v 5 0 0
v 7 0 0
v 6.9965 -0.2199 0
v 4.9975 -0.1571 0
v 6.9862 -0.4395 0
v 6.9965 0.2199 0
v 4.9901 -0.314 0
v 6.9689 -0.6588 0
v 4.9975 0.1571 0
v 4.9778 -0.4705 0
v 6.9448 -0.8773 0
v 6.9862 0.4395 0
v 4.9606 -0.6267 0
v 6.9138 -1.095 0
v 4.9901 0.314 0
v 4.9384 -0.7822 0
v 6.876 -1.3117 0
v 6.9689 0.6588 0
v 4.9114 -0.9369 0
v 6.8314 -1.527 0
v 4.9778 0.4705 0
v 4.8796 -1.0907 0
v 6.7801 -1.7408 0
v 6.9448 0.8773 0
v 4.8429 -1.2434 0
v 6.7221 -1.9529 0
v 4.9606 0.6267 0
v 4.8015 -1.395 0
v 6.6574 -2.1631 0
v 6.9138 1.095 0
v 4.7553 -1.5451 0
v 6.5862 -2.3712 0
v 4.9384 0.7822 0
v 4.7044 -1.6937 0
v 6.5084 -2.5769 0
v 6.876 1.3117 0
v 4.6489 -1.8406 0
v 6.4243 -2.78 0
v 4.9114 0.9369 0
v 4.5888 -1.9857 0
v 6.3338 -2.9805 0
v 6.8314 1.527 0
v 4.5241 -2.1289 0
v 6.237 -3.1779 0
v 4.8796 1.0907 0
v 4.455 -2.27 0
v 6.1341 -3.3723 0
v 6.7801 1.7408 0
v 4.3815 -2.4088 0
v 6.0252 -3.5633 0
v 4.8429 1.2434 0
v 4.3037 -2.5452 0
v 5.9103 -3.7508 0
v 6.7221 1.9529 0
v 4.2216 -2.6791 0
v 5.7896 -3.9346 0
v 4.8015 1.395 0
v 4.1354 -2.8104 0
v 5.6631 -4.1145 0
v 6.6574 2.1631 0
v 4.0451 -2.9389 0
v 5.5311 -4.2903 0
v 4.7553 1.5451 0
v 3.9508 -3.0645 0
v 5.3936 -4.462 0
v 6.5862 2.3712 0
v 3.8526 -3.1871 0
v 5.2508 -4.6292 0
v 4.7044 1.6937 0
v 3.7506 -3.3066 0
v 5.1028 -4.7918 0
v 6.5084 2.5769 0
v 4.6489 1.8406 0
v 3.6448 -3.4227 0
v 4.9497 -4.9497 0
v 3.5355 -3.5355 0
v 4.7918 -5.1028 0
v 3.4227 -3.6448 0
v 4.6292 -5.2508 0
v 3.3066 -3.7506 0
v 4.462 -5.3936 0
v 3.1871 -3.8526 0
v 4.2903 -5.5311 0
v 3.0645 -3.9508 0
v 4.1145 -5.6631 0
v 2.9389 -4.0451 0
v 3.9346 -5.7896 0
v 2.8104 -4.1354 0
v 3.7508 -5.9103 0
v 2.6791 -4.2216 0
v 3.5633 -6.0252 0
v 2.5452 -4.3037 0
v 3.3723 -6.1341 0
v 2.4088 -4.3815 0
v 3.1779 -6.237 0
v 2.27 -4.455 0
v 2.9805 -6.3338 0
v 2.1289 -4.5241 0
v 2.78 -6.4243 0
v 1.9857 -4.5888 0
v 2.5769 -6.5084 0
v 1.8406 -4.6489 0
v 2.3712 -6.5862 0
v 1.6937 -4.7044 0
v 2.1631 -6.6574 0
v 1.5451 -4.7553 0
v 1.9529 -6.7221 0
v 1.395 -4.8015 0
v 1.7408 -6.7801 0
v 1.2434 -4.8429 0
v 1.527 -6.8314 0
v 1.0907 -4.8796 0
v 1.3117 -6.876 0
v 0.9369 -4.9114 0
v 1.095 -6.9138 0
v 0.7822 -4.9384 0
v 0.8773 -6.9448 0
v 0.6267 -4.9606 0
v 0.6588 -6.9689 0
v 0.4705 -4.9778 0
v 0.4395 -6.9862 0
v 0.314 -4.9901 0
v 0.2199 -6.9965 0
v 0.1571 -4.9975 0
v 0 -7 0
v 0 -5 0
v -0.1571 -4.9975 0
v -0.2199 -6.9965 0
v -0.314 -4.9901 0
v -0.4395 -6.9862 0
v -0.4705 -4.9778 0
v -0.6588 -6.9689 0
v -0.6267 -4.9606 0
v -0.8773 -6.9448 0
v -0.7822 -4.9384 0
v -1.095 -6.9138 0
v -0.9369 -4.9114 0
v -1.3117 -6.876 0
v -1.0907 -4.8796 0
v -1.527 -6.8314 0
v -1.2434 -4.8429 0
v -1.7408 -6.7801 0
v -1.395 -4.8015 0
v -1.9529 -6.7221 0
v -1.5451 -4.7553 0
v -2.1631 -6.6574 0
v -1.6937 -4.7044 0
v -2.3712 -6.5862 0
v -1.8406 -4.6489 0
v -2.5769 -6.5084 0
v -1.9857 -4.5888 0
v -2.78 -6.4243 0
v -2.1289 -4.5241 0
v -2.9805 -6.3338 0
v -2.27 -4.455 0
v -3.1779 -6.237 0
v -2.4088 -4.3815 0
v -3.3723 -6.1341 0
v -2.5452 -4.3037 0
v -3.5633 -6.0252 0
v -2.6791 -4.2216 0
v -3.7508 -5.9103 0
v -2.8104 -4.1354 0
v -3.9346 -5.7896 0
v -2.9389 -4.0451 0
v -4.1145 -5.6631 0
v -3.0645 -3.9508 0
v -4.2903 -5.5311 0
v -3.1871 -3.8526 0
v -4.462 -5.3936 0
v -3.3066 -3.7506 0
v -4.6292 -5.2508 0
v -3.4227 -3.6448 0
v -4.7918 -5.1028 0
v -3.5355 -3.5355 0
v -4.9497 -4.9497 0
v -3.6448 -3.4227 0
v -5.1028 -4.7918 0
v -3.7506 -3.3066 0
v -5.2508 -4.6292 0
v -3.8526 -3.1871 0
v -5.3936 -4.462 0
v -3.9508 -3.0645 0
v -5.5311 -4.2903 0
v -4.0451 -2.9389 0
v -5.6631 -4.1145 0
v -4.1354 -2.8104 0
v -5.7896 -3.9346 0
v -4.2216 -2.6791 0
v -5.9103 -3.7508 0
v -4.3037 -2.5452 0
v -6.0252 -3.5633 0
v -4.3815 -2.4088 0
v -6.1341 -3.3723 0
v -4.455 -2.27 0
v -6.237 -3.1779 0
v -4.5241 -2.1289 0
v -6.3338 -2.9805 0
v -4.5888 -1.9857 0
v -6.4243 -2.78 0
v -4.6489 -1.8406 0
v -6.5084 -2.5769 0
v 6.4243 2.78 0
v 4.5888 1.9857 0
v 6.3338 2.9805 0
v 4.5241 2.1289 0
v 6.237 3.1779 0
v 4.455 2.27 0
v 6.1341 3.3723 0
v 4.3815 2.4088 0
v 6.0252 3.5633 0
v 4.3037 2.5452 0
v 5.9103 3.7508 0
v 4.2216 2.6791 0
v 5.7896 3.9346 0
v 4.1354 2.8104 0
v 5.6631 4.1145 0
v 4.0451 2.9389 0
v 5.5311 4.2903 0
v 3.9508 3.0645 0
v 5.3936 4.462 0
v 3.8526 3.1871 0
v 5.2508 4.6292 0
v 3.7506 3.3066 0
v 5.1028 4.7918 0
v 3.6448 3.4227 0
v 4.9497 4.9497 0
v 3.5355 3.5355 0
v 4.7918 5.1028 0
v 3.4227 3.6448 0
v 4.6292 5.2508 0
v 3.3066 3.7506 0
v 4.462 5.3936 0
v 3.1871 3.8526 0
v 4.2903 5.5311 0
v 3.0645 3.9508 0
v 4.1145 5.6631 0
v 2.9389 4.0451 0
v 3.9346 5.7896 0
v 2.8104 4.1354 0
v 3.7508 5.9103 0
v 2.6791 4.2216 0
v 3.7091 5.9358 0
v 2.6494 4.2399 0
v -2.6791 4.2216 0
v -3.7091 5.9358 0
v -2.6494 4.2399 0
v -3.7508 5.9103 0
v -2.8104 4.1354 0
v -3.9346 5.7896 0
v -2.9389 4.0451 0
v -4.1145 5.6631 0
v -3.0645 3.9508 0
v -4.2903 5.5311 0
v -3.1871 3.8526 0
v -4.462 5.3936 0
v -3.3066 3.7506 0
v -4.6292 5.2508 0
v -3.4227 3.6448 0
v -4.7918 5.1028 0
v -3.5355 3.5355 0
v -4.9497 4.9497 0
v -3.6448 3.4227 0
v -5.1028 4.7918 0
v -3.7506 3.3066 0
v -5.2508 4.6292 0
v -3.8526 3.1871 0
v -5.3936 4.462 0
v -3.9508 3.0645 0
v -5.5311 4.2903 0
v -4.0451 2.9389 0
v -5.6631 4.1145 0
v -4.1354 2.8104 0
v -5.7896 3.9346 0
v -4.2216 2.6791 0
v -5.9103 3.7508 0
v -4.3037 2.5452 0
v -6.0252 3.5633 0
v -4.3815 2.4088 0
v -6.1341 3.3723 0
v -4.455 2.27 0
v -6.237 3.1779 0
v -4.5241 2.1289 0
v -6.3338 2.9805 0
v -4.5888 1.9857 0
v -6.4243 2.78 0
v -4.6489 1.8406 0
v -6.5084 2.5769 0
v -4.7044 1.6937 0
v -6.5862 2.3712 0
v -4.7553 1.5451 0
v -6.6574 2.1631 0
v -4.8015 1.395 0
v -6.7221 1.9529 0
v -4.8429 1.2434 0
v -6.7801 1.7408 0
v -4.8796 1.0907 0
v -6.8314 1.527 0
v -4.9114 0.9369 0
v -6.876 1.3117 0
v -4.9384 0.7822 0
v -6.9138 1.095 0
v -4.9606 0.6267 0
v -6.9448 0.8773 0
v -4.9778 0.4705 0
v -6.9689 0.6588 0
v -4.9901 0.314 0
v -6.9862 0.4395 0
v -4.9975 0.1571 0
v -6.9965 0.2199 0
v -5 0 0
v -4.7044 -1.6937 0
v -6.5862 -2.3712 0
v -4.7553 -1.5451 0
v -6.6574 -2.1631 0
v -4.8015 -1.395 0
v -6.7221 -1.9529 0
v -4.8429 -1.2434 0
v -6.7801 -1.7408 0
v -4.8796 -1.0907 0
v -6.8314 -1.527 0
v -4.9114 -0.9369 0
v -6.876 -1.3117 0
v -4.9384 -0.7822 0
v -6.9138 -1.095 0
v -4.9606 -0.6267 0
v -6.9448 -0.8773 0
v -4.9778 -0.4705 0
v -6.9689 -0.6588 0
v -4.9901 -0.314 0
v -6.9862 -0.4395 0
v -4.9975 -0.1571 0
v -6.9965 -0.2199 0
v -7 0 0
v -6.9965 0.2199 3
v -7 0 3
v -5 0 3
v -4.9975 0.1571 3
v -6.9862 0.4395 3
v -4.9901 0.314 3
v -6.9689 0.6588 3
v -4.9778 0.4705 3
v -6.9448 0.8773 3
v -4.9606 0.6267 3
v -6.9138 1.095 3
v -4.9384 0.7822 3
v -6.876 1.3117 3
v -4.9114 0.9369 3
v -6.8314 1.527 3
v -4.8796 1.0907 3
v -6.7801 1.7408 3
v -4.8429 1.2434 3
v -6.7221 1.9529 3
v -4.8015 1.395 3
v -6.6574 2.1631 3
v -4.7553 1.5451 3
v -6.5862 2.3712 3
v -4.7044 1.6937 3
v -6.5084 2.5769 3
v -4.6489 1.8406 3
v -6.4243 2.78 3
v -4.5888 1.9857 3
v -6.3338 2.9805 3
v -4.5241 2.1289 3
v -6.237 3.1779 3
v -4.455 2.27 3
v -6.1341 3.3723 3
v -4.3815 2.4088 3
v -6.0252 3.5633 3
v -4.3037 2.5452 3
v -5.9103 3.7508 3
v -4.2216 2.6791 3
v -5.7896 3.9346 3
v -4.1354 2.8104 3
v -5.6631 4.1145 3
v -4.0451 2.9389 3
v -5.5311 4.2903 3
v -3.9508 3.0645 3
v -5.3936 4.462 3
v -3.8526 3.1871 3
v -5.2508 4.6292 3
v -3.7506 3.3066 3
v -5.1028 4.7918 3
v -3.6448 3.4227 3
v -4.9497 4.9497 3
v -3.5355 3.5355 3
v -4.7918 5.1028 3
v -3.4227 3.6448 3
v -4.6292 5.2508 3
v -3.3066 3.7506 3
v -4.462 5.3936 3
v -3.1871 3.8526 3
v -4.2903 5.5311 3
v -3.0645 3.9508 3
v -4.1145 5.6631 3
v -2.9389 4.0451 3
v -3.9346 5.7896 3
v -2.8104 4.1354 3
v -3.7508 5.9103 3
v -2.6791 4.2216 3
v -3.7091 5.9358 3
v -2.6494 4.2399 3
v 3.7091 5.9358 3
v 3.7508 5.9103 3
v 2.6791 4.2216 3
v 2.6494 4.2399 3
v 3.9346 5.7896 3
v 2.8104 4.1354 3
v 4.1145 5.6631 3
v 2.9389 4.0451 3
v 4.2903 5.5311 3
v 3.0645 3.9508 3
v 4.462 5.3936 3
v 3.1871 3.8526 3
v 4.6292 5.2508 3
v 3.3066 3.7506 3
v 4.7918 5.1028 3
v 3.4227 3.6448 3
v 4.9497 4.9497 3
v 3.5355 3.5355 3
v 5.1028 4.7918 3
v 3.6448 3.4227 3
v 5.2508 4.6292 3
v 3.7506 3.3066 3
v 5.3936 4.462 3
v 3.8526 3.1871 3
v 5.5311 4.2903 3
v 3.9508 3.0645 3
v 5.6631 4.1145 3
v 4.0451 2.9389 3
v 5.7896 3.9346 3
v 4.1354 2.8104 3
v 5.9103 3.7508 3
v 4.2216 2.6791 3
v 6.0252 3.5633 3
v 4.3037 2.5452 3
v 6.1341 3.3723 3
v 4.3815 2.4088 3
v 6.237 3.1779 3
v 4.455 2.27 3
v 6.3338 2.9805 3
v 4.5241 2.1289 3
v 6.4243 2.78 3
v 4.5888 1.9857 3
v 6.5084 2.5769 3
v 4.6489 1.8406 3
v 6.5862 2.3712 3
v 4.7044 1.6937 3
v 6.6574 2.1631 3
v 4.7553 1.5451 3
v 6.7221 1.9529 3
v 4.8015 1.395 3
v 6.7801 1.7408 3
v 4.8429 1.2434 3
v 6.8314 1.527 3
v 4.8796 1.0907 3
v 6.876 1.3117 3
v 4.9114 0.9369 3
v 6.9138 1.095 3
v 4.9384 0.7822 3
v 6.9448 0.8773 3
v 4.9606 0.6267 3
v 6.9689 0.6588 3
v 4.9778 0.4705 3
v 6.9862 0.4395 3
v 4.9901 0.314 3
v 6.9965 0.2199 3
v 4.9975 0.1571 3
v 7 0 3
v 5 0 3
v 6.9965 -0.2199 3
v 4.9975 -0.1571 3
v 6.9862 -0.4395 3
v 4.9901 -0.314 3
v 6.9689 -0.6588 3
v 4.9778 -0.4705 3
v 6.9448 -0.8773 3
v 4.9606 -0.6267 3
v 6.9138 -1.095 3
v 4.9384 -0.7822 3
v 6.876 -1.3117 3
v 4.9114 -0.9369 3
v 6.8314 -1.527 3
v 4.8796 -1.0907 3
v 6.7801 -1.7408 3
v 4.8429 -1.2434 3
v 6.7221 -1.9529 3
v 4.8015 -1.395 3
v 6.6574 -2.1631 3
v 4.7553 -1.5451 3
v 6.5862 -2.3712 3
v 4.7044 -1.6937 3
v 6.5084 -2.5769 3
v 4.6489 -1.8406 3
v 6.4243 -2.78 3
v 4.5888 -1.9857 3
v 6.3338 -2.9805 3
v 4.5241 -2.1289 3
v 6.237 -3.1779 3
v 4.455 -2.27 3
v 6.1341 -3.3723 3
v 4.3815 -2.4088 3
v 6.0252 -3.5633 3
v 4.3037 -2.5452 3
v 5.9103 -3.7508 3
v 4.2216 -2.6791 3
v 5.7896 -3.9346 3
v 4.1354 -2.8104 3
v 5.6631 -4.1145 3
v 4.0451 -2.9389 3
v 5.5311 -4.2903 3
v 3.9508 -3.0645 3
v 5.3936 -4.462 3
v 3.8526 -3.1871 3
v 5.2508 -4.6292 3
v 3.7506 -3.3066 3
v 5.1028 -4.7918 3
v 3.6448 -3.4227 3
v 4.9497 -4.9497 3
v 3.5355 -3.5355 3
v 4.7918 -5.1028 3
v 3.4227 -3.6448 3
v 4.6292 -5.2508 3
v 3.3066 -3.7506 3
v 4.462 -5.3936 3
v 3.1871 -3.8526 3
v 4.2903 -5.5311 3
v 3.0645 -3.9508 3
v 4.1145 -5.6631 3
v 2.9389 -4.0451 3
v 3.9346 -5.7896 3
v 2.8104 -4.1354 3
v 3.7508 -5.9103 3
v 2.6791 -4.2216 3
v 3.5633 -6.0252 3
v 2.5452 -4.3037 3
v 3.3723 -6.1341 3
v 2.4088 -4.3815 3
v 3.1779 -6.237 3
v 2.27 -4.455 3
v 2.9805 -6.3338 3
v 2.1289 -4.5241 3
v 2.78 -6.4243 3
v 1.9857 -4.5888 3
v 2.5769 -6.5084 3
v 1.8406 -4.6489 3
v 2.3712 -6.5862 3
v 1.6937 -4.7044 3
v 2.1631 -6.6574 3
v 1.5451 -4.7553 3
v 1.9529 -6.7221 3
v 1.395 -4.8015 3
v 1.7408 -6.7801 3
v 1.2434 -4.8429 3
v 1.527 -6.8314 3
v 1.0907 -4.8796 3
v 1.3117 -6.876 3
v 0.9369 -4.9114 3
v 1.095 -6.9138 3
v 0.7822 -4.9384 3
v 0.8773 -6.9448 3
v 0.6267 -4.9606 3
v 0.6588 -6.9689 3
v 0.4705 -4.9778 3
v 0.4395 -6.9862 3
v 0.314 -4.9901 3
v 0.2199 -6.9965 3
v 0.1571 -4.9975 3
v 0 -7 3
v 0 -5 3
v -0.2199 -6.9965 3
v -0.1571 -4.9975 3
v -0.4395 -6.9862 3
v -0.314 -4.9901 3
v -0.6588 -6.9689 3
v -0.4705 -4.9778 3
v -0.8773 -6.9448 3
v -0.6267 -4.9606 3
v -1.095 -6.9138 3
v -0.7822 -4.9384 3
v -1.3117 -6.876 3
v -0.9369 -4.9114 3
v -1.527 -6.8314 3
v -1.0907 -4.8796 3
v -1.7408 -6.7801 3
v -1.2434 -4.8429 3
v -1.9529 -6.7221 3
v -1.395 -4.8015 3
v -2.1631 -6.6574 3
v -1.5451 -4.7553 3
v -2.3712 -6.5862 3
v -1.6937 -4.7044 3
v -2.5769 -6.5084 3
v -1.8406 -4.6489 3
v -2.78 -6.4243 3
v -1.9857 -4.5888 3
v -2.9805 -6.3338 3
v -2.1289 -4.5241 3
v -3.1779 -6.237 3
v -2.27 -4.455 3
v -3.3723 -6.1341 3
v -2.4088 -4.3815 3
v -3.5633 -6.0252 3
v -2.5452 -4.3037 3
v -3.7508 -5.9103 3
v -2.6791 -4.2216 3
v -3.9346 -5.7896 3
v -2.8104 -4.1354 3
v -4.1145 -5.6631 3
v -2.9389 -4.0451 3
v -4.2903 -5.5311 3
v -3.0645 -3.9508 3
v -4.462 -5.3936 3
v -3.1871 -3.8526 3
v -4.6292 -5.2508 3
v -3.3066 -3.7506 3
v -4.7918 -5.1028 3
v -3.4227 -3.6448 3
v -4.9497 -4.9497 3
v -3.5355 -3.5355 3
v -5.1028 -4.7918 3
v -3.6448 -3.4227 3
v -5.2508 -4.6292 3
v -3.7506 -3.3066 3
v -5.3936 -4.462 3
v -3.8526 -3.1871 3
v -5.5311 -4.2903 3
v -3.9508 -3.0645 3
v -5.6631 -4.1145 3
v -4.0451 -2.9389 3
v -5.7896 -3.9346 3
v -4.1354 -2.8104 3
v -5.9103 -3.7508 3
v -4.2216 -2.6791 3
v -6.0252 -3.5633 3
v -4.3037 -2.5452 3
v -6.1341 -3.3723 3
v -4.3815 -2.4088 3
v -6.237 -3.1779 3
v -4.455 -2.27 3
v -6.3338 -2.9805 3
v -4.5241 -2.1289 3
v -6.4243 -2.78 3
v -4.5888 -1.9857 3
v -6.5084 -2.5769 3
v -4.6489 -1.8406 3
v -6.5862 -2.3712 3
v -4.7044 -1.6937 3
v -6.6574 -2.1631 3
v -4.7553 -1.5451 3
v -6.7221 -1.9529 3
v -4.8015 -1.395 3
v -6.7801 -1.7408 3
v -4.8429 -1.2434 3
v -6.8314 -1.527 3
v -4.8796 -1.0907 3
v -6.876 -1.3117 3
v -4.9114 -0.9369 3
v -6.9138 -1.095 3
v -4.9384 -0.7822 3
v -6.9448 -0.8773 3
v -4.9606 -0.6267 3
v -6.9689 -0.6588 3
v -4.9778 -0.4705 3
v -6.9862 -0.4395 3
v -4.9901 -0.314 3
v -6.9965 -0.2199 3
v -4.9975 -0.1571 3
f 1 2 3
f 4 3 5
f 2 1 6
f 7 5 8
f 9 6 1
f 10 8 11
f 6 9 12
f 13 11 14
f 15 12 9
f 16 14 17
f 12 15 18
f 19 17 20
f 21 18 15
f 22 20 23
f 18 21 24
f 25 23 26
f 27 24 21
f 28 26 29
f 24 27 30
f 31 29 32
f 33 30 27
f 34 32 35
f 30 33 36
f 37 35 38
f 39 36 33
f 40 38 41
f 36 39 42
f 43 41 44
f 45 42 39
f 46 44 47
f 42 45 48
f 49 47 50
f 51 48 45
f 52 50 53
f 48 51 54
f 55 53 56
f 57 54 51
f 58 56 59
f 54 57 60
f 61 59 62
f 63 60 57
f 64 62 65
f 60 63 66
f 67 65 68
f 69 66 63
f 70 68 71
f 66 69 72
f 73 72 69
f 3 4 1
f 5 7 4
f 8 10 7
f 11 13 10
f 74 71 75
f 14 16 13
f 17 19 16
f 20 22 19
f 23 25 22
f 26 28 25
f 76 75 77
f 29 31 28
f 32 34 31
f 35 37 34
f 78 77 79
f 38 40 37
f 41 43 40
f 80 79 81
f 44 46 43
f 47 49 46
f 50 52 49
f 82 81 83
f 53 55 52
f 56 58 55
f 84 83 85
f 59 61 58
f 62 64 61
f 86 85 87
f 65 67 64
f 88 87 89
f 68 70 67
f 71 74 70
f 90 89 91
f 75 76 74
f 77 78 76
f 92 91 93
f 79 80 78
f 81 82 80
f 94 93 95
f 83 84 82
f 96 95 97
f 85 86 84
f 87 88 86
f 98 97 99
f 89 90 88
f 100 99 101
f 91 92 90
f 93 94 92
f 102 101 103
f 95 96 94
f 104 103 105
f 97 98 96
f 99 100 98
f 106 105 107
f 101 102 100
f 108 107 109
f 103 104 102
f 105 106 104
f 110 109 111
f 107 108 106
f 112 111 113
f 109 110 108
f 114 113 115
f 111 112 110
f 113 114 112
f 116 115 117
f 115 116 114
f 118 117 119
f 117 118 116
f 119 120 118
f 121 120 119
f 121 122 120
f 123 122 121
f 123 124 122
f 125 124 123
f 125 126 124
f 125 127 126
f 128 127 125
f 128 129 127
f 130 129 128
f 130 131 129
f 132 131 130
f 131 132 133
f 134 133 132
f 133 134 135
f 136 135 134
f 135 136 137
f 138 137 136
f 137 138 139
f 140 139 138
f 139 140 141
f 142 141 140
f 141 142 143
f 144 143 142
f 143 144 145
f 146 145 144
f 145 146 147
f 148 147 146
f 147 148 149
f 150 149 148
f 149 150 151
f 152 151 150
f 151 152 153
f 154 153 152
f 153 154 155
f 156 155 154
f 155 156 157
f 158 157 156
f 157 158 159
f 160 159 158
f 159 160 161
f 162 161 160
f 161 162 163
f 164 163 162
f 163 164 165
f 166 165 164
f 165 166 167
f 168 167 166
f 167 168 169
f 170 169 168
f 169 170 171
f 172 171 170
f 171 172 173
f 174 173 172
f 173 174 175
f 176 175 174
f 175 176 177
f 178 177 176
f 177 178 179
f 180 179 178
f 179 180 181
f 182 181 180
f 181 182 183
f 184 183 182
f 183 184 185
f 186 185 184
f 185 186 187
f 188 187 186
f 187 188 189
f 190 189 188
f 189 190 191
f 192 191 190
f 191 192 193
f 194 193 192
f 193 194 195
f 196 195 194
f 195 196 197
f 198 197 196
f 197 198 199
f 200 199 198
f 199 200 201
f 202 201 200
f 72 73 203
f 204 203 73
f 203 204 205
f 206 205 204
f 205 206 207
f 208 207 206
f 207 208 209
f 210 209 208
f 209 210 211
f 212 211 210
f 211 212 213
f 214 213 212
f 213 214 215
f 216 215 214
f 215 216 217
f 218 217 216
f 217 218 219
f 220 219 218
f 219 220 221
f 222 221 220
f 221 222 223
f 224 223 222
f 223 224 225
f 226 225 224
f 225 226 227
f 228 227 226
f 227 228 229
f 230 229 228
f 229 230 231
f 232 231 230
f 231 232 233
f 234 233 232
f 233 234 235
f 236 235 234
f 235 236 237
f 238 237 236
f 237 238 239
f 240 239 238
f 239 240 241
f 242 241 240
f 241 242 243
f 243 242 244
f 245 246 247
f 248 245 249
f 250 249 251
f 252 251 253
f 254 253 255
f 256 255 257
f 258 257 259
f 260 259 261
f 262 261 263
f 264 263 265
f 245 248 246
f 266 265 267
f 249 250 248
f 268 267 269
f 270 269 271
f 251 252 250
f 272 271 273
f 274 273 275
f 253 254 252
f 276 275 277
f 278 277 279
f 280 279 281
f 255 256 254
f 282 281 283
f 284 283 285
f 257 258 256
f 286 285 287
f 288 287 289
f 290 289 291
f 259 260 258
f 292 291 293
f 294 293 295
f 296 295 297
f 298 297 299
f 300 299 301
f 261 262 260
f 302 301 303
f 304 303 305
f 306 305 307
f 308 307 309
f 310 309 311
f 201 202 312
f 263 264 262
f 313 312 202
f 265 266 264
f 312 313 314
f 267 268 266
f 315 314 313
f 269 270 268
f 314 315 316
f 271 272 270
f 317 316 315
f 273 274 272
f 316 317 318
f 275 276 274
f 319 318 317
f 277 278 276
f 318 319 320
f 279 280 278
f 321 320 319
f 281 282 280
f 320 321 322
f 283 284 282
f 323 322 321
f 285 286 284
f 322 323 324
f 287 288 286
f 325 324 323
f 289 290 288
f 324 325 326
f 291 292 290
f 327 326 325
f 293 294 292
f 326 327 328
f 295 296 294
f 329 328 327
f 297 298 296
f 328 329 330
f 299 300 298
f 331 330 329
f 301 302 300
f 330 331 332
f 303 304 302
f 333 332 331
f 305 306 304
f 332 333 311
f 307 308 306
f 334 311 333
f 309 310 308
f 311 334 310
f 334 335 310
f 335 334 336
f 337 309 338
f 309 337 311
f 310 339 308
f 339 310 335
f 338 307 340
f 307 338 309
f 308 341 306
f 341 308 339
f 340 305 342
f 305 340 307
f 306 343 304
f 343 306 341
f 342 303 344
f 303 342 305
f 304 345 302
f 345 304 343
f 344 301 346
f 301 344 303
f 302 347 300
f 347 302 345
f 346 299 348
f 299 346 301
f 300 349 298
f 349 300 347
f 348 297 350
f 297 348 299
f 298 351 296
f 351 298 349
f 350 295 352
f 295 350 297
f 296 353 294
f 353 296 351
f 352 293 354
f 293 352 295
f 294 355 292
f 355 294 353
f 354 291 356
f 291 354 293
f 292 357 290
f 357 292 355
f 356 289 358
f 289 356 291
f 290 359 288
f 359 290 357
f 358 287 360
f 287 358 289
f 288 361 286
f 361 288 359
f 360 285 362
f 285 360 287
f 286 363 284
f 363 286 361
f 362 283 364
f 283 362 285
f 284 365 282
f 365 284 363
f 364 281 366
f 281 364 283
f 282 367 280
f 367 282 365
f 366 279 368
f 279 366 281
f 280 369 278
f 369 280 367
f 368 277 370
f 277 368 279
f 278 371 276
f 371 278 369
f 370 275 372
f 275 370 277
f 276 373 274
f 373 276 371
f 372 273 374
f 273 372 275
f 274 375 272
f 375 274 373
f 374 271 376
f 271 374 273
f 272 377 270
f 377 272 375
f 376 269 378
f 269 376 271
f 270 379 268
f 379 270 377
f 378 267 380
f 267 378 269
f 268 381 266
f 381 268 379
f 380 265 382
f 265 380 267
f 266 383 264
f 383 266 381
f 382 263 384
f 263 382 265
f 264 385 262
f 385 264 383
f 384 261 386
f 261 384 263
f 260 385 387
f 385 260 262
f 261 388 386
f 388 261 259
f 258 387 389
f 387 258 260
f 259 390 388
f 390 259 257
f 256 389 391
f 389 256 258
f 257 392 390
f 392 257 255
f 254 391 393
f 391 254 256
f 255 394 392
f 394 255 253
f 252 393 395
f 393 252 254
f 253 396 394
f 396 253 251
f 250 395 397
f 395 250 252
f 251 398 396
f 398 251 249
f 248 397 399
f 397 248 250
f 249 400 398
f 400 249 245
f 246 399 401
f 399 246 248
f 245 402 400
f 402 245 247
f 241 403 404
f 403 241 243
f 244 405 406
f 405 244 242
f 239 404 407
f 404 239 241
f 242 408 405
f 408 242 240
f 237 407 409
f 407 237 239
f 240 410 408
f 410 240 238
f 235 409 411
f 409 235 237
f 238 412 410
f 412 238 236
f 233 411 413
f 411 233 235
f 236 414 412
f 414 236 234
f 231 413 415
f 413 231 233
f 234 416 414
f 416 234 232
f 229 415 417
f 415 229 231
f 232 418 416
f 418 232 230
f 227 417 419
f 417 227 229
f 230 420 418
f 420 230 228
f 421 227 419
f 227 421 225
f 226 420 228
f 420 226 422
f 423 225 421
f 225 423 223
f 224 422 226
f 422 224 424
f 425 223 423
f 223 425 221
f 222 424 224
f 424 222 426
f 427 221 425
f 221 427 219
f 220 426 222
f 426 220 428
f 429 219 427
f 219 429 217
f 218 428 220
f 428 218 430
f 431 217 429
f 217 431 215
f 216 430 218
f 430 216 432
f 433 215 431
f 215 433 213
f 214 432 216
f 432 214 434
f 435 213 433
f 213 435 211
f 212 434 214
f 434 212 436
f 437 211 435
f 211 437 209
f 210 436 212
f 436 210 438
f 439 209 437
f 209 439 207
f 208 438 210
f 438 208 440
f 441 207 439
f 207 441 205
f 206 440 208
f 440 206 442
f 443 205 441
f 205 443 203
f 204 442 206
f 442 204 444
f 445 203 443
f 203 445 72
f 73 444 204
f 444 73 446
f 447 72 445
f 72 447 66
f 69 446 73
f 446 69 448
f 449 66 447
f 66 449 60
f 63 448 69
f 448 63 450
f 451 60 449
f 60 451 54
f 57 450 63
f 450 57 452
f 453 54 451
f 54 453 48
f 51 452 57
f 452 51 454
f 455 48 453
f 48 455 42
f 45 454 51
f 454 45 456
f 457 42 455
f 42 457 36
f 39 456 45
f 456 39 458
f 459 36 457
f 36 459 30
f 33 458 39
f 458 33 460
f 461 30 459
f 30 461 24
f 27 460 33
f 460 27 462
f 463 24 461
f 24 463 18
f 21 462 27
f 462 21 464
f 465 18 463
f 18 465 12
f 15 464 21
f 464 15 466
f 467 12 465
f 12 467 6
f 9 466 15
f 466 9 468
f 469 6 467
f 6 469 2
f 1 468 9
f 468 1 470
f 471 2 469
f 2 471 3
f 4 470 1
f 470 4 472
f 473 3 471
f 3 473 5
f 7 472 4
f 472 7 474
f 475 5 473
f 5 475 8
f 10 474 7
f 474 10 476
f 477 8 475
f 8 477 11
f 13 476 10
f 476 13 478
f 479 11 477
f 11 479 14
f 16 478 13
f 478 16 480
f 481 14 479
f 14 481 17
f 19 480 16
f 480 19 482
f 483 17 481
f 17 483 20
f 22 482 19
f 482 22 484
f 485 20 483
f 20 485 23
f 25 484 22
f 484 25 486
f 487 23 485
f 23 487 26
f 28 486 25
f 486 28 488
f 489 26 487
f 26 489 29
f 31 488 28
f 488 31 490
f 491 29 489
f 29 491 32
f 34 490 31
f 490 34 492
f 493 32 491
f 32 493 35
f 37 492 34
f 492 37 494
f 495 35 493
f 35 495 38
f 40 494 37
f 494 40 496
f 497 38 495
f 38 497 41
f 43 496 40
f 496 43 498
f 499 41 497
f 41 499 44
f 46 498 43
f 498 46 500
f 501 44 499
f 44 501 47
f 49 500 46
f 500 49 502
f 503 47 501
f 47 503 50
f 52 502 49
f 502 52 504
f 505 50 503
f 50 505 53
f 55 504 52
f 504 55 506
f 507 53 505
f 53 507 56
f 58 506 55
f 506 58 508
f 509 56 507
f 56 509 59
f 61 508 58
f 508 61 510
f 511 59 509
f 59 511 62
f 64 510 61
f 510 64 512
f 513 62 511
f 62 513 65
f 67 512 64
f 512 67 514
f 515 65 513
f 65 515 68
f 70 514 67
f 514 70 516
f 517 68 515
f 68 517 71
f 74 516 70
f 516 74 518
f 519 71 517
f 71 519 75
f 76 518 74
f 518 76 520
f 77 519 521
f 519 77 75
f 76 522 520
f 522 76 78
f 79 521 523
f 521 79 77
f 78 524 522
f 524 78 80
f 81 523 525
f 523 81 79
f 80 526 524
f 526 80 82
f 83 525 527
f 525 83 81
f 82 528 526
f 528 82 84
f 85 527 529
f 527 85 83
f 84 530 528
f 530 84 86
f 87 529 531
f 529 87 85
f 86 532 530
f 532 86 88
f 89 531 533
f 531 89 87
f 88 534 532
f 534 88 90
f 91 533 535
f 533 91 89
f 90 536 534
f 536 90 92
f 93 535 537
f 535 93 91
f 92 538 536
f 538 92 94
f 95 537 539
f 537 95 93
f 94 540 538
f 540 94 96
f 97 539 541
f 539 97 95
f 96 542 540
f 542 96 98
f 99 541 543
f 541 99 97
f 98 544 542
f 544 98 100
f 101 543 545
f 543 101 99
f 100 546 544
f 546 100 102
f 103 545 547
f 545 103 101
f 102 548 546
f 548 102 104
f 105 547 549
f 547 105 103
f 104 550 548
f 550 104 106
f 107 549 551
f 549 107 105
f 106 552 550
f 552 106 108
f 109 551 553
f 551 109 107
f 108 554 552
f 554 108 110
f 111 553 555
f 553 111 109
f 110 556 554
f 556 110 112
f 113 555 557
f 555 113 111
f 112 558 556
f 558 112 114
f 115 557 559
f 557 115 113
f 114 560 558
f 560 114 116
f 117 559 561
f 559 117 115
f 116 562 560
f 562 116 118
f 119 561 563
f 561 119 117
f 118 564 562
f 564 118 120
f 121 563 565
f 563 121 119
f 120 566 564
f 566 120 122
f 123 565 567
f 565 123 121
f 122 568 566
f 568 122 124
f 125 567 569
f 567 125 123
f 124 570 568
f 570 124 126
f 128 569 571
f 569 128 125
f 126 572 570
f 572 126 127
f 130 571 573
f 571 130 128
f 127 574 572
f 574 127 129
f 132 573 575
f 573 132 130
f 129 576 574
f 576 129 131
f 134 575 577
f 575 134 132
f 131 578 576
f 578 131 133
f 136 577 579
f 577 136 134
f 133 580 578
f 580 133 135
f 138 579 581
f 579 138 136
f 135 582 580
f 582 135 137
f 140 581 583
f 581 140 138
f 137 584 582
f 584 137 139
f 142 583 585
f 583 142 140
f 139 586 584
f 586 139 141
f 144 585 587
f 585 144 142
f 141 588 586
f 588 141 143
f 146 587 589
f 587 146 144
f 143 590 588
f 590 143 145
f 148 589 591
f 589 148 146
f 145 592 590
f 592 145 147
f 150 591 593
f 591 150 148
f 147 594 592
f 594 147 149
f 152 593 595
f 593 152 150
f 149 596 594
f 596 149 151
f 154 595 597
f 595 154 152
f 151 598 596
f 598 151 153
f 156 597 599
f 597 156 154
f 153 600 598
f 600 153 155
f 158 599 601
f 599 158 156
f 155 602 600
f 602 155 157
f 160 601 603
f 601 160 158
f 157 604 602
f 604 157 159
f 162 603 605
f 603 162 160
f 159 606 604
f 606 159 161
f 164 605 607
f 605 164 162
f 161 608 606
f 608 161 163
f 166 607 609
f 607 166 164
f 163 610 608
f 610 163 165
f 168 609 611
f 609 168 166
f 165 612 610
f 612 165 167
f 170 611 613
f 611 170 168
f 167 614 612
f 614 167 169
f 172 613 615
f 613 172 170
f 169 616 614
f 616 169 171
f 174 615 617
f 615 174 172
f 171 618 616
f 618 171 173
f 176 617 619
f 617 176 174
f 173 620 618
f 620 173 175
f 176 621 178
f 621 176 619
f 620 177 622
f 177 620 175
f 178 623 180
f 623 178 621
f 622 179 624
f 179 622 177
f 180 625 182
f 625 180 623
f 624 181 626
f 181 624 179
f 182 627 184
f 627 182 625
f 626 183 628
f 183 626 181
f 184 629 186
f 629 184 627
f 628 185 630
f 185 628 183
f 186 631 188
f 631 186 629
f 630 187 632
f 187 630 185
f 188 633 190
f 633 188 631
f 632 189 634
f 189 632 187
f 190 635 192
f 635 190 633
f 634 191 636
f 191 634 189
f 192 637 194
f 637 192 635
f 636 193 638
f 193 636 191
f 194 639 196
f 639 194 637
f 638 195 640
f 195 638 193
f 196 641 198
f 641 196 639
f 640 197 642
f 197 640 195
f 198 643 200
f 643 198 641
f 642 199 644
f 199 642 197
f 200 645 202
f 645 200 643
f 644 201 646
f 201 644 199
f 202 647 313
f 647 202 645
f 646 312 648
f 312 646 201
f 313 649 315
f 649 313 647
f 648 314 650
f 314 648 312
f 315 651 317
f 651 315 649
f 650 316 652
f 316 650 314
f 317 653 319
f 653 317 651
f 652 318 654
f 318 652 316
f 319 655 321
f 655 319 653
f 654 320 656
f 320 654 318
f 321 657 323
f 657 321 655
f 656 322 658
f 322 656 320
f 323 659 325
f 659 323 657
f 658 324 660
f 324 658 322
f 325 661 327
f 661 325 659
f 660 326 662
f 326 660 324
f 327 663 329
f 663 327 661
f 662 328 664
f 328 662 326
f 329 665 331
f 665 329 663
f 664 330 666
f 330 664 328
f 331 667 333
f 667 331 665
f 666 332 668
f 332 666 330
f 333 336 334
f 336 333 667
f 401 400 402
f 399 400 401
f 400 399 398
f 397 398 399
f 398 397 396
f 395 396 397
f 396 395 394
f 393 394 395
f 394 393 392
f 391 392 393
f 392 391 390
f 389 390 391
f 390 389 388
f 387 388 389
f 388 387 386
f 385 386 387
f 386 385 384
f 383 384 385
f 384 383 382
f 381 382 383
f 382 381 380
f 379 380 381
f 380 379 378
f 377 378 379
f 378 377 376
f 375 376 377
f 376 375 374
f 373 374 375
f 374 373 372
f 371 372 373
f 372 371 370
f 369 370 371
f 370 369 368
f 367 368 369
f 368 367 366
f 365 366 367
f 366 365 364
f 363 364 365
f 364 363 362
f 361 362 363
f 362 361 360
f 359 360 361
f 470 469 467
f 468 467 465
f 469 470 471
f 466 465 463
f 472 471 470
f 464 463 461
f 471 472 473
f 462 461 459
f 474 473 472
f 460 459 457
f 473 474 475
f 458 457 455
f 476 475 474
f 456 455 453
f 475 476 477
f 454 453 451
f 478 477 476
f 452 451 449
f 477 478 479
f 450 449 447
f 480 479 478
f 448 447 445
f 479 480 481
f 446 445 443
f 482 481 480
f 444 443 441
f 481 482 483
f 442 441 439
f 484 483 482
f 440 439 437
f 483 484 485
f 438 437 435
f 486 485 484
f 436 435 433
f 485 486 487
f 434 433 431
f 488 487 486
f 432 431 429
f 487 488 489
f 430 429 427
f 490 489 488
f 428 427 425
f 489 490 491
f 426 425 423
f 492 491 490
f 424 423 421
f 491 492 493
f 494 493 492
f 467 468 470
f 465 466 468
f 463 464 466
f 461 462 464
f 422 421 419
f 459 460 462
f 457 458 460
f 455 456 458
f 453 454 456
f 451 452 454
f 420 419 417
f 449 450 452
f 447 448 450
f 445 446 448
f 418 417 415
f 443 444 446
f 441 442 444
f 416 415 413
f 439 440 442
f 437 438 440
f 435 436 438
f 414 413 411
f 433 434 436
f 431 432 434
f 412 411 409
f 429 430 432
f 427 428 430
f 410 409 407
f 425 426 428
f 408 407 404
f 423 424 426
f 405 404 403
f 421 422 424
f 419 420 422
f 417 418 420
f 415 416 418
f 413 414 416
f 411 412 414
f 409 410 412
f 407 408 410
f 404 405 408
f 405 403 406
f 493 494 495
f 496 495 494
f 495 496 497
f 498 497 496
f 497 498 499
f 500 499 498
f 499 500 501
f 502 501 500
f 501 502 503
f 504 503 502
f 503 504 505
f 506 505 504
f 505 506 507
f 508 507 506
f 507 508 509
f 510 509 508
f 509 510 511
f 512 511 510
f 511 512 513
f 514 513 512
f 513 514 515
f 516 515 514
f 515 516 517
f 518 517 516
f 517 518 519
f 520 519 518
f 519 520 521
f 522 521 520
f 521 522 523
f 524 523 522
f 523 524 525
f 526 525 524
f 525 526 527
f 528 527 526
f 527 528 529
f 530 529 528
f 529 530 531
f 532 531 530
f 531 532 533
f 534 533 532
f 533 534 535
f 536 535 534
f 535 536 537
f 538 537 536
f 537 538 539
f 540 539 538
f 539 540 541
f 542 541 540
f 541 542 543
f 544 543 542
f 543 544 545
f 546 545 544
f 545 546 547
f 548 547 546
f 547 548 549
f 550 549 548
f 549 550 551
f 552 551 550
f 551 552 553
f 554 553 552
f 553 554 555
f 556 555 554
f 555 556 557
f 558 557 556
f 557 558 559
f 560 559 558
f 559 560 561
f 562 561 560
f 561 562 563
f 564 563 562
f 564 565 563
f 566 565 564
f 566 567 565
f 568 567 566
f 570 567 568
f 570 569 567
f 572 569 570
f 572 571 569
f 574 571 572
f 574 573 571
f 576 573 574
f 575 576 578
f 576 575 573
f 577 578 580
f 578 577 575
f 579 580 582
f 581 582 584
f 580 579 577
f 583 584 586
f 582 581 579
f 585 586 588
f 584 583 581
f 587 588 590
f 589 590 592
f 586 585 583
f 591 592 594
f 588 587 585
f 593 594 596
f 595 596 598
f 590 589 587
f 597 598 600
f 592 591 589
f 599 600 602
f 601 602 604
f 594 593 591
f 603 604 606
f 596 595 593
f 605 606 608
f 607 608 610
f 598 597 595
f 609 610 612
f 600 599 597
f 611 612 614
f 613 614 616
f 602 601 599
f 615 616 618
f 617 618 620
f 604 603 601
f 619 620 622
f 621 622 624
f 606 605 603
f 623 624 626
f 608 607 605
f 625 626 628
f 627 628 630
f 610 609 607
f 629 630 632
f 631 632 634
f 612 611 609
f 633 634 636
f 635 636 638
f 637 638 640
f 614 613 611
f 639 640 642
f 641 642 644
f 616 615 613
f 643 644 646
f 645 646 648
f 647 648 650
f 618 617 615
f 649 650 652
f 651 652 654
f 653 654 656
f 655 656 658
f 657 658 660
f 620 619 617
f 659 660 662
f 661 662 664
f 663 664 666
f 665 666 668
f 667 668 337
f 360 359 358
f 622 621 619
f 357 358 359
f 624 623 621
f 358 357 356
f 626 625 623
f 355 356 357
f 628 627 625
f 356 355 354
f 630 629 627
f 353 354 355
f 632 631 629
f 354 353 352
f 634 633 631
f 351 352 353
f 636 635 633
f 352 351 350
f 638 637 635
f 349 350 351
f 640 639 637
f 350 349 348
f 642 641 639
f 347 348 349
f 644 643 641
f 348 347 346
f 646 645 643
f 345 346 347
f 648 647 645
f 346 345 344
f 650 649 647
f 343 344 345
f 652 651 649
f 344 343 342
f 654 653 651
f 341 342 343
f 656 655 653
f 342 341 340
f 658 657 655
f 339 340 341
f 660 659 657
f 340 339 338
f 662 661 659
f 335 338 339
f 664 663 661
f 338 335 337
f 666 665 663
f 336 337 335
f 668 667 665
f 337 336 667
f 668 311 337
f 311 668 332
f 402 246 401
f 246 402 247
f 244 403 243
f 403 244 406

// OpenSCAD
// Inner diameter
diameter = 10;

// Wall thickness
thickness = 2;

// Clip length
length = 3;

// Opening angle
angle = 64;

cutout = diameter*2;

difference() {
  rotate_extrude($fn=200)
    translate([diameter/2,0,0])
      square([thickness, length]);

  translate([0,0,-1])linear_extrude(height=length*2)
    polygon([[0,0],[sin(angle/2)*cutout,cos(angle/2)*cutout],[-sin(angle/2)*cutout,cos(angle/2)*cutout]]);
}
